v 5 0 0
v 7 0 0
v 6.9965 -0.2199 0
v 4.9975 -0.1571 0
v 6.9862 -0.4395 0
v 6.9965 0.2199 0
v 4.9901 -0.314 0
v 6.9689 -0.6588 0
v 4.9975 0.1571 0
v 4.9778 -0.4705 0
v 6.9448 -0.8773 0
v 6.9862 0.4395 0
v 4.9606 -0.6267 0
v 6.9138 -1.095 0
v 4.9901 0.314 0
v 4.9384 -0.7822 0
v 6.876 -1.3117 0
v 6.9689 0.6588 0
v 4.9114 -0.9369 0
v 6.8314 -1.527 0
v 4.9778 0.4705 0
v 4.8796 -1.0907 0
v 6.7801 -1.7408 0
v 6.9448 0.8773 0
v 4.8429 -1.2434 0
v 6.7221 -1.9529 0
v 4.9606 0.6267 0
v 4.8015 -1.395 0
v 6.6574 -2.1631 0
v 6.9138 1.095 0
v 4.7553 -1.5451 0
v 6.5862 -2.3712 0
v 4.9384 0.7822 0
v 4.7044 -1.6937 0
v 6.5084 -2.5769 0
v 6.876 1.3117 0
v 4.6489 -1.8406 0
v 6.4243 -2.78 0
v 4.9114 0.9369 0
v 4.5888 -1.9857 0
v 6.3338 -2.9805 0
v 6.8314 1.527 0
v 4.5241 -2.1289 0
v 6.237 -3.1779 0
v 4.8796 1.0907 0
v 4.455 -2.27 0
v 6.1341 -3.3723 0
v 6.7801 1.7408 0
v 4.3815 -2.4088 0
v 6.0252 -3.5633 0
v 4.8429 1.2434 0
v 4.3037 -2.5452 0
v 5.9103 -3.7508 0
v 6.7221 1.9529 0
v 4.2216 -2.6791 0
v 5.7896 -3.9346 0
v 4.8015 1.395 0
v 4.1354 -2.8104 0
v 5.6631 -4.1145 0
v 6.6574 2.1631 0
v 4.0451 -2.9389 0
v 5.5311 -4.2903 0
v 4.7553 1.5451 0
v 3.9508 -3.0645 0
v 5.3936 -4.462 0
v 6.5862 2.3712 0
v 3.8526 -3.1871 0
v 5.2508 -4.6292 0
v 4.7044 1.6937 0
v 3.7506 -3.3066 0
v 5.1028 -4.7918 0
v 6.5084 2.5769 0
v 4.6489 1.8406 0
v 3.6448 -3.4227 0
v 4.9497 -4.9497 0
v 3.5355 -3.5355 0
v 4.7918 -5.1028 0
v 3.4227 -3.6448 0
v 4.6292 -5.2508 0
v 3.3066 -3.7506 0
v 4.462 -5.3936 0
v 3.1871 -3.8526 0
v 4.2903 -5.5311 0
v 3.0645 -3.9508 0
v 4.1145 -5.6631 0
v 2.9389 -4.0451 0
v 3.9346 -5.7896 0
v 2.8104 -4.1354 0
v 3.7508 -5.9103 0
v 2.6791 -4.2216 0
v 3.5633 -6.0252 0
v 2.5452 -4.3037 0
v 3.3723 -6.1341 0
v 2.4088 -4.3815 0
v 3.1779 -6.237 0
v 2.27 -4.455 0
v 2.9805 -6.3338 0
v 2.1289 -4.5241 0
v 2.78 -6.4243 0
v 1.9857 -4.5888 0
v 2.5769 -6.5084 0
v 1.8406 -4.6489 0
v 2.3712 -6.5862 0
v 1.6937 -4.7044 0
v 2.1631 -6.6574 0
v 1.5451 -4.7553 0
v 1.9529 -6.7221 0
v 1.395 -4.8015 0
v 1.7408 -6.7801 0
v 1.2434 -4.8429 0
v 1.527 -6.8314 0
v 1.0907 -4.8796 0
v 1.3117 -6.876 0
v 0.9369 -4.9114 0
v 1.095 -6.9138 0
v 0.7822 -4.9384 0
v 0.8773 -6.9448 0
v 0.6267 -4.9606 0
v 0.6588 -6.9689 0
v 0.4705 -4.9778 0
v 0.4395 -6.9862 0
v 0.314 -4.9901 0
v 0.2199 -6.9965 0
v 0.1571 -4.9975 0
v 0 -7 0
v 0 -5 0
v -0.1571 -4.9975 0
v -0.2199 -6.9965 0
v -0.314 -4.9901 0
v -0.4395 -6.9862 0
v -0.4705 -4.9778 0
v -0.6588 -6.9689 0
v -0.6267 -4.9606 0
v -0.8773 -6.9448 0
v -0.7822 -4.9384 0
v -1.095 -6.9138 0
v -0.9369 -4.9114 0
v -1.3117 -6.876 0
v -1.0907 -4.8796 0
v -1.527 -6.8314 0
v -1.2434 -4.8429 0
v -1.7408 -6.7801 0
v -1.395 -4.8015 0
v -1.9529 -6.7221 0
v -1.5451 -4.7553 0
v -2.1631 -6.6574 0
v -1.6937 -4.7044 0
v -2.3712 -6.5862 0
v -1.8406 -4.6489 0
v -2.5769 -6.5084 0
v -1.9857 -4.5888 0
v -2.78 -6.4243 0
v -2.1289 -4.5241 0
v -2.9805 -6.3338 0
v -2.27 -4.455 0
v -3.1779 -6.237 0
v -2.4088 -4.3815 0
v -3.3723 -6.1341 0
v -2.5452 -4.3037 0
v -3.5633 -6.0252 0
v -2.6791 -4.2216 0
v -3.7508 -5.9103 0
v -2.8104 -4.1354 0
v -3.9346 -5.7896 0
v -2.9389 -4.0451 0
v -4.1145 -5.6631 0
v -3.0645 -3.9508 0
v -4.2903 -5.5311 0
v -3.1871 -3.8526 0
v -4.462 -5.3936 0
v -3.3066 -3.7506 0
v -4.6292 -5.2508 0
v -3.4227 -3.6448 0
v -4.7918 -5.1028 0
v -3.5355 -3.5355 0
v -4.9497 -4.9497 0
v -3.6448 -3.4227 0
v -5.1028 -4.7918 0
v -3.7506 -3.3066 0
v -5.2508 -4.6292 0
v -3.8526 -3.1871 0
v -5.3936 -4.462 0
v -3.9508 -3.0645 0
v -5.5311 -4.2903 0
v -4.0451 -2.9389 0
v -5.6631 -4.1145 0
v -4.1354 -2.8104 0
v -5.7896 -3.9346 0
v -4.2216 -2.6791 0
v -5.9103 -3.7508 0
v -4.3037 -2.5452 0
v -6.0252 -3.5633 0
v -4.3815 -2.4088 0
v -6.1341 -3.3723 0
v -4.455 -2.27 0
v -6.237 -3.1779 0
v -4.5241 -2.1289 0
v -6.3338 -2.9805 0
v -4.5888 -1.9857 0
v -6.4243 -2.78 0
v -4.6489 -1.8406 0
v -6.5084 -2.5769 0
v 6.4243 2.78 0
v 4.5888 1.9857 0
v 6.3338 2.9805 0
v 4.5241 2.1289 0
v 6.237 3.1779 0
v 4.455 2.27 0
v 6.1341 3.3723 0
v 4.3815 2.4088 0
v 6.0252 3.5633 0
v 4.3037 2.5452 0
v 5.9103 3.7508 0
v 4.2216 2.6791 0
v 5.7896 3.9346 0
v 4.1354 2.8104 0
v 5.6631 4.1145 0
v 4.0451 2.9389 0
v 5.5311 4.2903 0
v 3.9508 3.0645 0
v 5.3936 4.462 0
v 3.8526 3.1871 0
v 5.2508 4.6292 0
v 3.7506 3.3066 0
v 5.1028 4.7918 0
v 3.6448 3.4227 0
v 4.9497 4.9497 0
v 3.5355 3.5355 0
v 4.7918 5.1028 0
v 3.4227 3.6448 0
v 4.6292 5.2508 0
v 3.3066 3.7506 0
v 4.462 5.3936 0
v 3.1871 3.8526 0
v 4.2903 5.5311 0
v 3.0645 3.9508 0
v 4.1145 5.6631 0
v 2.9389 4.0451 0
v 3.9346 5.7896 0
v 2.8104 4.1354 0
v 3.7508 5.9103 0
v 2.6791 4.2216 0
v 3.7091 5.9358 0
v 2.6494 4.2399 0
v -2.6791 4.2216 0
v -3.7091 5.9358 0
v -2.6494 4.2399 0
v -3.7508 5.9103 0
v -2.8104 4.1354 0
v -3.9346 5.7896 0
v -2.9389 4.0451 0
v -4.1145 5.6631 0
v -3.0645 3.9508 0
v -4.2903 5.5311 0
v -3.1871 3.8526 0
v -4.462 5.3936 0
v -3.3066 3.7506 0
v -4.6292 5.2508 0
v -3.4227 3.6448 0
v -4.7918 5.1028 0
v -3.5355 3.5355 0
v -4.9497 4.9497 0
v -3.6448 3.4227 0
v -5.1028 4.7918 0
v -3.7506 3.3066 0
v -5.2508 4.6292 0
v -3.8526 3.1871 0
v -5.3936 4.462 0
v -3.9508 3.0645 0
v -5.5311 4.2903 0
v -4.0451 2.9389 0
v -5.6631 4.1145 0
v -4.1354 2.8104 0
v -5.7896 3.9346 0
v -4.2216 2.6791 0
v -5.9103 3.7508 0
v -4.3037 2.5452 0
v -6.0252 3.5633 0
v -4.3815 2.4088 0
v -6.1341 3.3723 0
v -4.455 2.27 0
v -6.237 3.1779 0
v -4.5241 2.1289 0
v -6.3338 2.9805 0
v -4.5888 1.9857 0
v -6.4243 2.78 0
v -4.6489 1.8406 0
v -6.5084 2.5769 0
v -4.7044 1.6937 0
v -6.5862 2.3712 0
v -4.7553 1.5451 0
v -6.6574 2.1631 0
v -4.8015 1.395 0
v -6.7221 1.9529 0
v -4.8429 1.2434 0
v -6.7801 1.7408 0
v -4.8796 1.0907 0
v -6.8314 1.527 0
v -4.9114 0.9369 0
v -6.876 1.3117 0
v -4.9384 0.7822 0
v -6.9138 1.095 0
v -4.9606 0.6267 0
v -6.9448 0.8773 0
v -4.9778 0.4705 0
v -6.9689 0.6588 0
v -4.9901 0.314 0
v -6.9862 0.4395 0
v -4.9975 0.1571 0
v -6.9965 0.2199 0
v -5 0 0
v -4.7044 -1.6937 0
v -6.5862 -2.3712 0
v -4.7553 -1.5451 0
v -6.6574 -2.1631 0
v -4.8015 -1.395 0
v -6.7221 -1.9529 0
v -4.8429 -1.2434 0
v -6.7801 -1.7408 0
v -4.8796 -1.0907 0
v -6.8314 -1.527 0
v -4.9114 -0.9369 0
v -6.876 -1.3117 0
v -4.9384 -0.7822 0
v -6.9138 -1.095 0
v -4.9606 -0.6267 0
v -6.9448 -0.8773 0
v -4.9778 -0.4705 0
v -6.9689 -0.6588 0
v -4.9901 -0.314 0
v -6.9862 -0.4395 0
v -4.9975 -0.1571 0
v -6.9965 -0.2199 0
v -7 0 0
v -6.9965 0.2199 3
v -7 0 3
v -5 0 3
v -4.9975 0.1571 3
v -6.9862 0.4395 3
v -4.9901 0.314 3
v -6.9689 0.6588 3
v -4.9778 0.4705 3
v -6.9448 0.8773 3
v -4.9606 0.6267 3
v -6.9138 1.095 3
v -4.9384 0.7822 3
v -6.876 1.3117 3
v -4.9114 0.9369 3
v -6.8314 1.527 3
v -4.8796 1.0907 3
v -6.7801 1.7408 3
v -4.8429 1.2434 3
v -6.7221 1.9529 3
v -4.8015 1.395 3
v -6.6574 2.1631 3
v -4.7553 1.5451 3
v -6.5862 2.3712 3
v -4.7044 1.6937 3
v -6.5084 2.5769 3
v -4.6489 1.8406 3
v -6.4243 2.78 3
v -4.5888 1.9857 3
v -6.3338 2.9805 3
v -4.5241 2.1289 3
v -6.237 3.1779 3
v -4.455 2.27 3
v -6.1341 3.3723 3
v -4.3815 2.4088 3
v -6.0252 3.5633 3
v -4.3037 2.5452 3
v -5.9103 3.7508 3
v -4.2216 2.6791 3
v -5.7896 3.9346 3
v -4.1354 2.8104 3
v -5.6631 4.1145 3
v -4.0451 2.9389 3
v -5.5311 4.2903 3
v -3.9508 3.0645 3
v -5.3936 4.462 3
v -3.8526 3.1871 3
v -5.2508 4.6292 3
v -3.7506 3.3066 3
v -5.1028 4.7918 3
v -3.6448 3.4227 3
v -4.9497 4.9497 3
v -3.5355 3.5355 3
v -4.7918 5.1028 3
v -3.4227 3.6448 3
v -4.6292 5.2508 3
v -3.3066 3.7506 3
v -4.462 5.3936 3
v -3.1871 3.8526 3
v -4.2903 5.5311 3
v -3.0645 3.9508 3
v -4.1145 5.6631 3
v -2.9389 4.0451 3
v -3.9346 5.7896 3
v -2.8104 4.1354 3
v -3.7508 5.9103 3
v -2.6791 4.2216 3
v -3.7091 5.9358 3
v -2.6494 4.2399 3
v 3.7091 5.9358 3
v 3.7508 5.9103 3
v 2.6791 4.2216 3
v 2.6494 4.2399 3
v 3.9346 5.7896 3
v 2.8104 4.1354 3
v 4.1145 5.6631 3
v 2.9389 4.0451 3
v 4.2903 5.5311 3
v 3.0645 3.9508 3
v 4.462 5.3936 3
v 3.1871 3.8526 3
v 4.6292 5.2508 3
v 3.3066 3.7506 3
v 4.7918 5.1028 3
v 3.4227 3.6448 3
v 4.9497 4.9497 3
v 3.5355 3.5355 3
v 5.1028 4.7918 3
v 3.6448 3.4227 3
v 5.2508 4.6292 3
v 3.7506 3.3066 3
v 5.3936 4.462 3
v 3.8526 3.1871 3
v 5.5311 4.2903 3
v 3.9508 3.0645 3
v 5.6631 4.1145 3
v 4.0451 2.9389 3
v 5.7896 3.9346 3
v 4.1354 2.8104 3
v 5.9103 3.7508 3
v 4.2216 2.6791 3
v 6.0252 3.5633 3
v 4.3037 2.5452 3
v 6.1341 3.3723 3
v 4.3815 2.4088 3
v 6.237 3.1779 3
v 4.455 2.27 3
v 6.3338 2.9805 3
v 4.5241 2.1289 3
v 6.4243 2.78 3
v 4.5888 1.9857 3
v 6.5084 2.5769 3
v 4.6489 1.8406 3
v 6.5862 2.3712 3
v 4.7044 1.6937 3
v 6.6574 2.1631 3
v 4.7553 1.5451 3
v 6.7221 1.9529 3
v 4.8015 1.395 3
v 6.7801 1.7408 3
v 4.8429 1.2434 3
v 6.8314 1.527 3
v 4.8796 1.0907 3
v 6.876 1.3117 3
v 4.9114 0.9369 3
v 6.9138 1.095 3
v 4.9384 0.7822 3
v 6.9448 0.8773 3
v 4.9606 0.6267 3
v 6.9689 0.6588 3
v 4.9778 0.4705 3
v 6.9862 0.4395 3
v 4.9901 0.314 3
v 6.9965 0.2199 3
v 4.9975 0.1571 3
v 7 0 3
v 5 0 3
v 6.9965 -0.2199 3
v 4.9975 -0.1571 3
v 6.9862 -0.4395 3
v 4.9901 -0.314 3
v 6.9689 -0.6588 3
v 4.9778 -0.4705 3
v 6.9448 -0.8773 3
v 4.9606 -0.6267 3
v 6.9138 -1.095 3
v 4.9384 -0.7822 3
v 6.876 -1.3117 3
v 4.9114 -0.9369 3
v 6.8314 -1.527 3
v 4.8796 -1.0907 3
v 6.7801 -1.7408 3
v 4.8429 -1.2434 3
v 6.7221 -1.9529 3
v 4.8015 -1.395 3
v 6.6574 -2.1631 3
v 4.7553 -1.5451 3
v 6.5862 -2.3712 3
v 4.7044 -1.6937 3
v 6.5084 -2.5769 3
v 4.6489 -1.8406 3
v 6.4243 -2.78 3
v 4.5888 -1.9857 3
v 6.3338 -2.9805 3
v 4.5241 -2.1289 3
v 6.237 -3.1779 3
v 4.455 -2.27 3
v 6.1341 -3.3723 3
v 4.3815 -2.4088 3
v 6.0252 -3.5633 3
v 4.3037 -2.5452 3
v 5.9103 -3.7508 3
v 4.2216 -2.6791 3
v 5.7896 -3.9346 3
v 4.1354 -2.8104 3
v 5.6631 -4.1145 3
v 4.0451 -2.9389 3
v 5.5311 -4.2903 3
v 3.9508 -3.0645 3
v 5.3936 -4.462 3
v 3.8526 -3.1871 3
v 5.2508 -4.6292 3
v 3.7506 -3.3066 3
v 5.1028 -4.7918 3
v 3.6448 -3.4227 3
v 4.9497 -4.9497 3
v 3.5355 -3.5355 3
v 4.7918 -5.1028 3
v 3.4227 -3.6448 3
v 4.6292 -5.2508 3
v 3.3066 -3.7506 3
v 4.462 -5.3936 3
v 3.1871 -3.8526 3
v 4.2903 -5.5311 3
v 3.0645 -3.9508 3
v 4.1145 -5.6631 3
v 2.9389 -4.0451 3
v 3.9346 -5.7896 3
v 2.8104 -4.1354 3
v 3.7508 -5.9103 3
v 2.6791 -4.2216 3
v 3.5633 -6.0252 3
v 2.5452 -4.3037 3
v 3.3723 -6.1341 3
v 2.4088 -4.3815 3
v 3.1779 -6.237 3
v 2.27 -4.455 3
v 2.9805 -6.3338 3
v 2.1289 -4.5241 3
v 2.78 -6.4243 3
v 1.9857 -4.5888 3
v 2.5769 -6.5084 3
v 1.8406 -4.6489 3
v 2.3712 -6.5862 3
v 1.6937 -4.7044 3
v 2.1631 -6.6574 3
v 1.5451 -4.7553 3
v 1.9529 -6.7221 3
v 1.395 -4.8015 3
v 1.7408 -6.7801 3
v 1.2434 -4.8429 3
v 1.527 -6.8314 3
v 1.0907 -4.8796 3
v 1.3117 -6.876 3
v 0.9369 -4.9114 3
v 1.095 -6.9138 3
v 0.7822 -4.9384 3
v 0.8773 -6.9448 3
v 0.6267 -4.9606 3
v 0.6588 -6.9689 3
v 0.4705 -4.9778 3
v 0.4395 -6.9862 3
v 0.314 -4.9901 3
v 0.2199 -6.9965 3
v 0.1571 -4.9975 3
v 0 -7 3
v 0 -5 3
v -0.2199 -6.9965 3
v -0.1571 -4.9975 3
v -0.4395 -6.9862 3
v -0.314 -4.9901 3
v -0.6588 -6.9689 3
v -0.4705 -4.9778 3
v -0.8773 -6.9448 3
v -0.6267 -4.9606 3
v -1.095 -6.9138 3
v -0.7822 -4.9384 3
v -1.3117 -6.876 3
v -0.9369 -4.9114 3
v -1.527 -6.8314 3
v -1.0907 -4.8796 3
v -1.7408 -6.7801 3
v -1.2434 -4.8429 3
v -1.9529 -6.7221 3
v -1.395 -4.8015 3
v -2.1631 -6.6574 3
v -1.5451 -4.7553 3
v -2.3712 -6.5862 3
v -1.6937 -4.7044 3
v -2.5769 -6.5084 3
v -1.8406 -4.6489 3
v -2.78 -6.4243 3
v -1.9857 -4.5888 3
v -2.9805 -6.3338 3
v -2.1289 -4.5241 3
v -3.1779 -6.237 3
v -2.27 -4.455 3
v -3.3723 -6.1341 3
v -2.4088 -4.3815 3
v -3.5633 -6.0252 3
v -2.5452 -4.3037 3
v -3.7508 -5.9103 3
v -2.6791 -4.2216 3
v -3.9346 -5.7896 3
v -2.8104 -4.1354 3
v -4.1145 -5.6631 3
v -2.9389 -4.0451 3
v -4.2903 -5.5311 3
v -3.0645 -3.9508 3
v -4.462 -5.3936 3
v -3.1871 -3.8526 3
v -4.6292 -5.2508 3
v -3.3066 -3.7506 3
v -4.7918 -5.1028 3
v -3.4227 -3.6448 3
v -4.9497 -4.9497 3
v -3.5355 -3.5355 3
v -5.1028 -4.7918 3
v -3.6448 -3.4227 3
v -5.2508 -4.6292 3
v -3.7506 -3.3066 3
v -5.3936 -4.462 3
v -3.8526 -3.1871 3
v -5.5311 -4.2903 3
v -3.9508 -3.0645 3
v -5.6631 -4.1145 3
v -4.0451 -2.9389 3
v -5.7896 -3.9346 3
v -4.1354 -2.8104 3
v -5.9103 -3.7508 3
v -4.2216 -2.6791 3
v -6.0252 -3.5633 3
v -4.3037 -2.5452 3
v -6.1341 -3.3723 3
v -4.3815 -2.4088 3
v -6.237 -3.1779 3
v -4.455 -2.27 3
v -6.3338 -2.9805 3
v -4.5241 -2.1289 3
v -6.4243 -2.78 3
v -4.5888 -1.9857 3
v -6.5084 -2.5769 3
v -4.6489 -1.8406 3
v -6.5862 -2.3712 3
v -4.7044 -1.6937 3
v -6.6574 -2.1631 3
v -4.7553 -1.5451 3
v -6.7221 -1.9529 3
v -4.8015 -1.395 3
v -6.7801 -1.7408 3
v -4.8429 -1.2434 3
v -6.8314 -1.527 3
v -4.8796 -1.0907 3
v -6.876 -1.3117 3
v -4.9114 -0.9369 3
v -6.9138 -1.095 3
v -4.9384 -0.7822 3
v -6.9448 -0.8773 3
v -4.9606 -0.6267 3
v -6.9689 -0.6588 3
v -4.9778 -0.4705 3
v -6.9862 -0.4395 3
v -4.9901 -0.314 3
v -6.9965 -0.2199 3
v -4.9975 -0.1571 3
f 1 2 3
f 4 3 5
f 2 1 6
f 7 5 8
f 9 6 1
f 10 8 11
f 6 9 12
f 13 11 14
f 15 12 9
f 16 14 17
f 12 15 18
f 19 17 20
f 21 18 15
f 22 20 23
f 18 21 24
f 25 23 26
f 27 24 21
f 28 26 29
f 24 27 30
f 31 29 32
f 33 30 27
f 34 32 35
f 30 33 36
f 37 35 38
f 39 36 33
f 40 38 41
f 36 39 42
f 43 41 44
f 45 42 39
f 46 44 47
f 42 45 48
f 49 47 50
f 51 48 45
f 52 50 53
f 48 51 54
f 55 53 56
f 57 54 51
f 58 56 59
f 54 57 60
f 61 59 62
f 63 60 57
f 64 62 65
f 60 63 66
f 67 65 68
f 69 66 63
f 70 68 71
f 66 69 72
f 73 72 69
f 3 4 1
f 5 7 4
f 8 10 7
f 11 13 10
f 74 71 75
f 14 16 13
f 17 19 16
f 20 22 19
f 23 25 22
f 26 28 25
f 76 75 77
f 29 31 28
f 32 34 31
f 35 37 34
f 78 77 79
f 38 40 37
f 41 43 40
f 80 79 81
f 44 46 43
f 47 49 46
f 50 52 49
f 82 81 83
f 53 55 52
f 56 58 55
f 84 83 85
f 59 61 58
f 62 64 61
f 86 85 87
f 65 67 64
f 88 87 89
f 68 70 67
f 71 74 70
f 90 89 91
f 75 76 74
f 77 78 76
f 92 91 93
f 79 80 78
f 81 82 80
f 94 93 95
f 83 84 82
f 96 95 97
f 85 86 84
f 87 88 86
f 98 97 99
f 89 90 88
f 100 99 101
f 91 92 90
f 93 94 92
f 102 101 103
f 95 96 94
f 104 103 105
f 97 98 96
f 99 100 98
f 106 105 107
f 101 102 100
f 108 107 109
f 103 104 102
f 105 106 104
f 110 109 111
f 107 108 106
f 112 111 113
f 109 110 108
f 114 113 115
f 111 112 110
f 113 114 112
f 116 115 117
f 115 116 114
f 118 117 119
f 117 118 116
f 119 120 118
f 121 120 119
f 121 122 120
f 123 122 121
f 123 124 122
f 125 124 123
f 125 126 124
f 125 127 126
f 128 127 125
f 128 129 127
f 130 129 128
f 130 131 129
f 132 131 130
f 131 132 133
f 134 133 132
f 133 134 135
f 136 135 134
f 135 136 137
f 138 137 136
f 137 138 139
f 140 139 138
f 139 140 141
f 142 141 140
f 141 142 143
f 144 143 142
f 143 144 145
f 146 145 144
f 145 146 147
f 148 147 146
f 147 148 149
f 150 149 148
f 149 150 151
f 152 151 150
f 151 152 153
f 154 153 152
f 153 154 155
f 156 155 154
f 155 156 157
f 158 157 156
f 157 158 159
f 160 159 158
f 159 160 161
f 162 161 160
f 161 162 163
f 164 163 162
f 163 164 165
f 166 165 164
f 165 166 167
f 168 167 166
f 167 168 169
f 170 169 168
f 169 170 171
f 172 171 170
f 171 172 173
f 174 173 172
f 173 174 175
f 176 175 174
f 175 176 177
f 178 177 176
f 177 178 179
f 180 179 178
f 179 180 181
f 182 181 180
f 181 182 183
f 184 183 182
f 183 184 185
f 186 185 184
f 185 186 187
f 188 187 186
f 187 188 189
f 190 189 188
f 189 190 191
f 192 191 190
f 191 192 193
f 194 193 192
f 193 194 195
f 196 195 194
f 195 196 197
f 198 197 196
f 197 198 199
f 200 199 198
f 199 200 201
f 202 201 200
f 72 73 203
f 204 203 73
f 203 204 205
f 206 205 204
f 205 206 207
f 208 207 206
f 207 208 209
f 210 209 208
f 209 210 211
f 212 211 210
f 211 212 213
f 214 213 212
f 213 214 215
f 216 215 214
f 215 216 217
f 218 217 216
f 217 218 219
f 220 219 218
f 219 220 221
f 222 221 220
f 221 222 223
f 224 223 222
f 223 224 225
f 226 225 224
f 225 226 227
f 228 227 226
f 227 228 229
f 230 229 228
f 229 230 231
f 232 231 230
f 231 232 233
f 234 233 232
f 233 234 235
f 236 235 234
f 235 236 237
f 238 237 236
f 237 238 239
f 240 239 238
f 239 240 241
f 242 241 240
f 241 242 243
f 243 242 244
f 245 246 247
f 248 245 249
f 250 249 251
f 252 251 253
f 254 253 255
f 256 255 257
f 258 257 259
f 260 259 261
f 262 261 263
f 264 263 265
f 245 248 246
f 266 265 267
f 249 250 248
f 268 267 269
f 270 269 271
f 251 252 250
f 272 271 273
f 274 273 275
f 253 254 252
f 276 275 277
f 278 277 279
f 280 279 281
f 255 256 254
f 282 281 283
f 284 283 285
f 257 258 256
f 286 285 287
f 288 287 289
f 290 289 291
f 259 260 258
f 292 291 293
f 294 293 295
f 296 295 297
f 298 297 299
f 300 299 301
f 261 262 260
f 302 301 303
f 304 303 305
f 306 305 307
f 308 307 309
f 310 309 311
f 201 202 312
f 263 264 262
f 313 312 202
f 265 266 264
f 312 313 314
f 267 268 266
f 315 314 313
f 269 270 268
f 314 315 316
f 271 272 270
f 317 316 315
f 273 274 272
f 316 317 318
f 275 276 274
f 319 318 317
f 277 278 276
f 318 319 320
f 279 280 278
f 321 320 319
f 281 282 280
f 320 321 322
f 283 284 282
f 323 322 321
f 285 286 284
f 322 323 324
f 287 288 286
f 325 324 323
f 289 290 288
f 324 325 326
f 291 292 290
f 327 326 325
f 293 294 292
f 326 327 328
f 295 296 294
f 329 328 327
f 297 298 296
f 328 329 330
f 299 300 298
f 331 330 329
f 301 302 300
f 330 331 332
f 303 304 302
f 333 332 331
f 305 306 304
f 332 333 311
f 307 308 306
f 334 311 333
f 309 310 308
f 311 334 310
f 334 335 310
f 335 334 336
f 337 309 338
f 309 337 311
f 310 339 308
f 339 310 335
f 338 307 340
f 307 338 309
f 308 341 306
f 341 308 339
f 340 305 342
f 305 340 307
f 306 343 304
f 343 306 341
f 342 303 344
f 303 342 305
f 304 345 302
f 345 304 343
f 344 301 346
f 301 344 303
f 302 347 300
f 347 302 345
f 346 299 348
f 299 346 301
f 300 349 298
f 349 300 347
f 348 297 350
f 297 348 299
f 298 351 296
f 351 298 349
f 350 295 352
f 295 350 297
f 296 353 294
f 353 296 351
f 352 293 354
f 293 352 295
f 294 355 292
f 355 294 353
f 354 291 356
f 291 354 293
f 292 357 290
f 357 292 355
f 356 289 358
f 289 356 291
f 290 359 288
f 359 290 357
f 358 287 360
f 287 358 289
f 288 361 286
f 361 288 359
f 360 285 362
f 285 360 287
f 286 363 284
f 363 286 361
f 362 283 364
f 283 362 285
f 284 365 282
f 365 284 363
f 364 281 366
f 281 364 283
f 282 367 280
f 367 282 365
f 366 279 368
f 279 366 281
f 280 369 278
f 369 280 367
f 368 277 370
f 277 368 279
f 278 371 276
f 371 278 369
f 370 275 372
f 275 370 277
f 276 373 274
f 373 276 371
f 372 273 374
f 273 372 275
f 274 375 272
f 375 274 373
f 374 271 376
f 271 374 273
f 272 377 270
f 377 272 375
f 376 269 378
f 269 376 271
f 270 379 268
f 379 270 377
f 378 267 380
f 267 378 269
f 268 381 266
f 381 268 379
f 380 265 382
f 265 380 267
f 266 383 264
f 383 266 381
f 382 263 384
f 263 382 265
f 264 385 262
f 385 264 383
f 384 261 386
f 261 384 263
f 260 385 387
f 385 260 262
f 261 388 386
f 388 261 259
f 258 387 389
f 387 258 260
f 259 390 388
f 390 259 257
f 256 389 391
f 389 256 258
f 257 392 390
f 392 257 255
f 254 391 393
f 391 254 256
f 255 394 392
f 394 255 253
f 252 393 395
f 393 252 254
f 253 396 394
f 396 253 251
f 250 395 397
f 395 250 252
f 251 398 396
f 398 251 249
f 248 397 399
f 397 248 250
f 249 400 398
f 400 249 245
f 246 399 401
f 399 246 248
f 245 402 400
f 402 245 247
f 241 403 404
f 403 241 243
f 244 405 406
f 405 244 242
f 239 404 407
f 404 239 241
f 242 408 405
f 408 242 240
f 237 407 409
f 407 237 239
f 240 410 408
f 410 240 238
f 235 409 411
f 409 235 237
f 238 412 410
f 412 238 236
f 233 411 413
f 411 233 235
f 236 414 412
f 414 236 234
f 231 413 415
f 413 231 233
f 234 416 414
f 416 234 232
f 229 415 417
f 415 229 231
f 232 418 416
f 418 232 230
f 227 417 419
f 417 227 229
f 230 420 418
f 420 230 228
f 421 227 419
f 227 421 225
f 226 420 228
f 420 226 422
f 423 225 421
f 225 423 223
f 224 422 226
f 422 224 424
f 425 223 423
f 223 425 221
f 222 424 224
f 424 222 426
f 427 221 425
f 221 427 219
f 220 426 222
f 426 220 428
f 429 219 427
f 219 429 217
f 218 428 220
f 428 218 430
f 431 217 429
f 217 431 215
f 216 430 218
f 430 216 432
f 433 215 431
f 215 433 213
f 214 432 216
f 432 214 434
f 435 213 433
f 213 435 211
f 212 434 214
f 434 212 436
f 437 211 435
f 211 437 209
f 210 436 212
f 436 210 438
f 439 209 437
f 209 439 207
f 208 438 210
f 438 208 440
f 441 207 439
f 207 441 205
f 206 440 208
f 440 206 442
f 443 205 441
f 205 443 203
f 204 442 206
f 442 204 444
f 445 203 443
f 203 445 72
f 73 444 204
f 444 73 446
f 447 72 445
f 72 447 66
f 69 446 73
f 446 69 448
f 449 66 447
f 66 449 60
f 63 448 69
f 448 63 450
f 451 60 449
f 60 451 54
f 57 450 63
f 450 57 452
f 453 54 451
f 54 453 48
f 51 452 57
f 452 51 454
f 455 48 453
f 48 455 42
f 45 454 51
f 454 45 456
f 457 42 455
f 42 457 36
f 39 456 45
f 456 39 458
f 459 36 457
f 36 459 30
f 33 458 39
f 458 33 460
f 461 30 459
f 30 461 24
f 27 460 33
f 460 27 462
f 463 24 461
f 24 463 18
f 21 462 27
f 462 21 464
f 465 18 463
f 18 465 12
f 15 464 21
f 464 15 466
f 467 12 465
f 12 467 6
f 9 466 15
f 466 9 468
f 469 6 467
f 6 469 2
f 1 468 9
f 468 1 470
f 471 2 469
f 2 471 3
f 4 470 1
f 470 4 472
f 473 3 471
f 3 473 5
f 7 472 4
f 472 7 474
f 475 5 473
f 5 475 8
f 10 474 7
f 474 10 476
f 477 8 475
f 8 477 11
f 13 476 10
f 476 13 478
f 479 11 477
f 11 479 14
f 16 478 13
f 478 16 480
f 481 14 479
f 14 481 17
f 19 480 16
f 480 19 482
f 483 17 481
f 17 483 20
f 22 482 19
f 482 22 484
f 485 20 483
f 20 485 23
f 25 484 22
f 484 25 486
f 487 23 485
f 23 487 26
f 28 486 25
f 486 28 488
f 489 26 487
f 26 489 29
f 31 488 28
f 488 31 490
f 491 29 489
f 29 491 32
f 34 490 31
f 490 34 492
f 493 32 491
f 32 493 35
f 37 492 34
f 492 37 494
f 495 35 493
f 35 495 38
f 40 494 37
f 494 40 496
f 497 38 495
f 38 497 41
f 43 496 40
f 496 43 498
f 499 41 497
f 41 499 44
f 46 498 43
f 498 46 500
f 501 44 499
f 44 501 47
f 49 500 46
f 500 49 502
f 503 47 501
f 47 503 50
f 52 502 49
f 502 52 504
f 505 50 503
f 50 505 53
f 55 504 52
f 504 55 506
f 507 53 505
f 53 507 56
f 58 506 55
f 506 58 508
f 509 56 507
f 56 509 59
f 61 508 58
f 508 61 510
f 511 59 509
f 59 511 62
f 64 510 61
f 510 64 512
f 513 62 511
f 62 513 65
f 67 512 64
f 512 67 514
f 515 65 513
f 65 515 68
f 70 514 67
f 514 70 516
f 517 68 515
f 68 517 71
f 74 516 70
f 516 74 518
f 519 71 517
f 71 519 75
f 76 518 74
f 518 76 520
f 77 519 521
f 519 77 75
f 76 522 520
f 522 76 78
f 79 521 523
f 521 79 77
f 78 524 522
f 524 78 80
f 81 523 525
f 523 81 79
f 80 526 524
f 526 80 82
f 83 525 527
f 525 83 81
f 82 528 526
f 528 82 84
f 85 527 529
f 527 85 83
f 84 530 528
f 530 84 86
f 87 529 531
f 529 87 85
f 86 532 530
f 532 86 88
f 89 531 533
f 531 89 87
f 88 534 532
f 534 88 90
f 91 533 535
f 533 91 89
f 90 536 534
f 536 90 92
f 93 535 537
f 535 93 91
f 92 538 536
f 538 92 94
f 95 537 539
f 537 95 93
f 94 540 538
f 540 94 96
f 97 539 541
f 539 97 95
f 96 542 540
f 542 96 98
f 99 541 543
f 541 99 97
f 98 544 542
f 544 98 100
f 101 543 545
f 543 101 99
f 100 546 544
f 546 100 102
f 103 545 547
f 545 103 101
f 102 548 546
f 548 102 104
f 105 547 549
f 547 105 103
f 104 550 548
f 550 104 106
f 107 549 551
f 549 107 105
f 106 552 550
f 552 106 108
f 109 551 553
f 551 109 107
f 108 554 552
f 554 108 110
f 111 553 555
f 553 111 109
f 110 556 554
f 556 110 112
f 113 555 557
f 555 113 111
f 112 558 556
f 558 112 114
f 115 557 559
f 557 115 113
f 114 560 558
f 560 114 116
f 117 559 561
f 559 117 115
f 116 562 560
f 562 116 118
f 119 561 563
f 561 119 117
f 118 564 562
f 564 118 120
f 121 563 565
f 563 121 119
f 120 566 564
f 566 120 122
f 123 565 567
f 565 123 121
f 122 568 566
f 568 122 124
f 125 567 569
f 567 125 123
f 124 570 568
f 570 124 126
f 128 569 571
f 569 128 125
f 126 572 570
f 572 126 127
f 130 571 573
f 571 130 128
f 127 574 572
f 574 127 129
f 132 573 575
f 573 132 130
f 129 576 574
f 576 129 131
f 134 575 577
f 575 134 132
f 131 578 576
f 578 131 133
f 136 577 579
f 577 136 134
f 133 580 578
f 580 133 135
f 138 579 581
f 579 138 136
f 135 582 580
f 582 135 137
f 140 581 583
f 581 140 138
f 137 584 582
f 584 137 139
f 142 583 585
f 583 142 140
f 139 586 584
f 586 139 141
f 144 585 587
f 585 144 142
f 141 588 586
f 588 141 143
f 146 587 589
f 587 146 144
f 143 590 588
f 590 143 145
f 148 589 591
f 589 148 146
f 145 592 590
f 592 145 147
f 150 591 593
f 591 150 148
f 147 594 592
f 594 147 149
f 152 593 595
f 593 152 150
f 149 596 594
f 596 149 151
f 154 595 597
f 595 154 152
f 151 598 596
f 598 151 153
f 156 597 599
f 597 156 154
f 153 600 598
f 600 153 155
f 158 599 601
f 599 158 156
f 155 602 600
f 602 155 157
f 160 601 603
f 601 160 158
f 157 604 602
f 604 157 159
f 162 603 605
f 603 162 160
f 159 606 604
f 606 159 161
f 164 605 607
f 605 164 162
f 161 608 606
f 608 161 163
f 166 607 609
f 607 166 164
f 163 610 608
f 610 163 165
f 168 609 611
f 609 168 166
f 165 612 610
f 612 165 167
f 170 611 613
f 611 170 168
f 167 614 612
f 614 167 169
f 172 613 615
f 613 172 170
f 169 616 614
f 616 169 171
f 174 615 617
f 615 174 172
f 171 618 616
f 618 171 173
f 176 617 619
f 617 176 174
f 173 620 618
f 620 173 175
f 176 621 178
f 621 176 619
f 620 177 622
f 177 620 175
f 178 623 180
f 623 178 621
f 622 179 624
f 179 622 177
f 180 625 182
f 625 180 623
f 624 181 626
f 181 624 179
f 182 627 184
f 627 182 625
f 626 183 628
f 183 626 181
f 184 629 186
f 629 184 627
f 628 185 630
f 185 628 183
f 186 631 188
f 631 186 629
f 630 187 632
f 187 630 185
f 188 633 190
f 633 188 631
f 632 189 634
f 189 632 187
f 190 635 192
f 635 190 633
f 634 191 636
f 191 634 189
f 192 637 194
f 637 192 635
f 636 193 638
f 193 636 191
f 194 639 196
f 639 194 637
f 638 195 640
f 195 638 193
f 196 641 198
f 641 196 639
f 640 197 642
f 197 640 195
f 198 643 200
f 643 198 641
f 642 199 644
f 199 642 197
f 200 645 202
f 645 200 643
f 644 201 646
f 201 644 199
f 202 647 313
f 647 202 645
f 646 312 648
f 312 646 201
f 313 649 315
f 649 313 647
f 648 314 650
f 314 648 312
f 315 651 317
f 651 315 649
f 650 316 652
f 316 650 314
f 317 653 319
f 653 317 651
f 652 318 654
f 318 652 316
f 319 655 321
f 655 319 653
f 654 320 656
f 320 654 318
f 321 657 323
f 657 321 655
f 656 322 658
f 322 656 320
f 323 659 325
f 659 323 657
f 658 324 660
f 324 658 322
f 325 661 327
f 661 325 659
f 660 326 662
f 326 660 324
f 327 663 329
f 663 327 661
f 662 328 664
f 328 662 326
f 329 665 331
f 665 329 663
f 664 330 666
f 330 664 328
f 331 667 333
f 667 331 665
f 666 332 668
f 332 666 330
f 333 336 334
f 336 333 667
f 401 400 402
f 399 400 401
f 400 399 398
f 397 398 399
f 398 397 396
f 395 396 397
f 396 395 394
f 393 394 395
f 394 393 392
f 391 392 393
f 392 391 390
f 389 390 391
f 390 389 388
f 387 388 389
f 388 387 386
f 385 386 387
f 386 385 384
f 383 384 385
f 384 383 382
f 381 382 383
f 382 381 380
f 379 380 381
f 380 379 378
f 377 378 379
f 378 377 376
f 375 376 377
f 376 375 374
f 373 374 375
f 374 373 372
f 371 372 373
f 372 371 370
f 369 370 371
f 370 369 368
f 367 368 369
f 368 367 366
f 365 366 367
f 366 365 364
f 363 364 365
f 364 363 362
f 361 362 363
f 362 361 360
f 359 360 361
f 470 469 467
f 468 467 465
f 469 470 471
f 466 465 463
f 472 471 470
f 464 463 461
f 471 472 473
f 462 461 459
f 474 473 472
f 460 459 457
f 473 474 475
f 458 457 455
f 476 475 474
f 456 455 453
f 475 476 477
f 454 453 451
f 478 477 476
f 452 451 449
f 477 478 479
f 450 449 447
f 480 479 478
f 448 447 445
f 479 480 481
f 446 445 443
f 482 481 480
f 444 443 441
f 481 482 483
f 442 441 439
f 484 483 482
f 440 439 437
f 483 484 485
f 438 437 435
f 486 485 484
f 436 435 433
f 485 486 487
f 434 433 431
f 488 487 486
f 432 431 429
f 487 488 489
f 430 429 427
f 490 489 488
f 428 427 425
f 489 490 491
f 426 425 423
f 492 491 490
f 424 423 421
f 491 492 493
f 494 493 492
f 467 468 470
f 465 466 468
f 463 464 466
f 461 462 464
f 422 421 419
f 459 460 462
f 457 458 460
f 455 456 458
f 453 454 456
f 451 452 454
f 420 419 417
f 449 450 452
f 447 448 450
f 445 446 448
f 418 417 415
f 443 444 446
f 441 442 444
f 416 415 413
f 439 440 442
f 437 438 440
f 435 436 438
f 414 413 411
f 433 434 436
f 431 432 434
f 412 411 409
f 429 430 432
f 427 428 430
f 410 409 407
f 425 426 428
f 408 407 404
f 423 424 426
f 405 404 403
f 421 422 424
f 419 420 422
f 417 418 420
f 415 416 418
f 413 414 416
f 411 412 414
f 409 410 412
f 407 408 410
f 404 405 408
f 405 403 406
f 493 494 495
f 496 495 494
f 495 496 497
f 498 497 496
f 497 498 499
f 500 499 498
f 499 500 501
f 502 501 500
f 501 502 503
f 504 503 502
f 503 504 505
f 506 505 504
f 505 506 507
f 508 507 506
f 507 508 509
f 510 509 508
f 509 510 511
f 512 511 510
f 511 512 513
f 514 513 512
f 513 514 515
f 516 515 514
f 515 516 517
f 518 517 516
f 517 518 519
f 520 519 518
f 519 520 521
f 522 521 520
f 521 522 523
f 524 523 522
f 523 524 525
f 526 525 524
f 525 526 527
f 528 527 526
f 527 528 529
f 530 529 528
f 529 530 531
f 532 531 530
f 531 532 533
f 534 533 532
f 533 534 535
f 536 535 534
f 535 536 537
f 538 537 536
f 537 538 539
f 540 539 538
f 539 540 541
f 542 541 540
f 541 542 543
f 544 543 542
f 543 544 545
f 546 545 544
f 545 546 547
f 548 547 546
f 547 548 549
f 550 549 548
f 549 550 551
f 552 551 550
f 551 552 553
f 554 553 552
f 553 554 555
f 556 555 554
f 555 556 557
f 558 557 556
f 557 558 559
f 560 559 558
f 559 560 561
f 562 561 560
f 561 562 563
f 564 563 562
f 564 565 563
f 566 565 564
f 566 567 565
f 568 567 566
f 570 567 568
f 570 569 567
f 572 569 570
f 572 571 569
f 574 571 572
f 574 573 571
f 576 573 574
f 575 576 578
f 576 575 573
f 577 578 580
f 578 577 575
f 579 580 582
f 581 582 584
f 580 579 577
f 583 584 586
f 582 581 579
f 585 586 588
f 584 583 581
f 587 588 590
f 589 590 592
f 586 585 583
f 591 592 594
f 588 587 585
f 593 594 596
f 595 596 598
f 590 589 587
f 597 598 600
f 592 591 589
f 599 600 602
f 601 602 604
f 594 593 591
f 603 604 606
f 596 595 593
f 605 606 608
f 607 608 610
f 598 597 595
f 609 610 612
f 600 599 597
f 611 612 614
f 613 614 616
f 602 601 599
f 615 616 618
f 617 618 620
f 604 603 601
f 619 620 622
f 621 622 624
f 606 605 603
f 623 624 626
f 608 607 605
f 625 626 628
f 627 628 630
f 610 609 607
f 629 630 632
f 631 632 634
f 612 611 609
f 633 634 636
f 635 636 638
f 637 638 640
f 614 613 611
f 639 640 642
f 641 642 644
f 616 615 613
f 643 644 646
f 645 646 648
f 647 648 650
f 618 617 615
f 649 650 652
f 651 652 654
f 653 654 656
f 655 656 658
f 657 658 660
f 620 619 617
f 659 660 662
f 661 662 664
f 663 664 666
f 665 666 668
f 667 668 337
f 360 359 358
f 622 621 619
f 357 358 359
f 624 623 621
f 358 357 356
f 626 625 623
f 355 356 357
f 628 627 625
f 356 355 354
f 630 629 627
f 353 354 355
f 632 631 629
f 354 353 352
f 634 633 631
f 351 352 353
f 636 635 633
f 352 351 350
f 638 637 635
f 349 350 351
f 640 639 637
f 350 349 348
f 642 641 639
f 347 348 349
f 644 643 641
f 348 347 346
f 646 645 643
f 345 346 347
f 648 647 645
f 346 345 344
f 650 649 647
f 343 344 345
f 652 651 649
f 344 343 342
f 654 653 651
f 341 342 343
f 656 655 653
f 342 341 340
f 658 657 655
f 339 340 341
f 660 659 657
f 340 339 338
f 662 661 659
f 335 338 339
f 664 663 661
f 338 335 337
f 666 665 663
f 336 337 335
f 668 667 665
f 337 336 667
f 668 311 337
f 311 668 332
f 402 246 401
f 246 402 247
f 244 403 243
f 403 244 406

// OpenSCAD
// Inner diameter
diameter = 10;

// Wall thickness
thickness = 2;

// Clip length
length = 3;

// Opening angle
angle = 64;

cutout = diameter*2;

difference() {
  rotate_extrude($fn=200)
    translate([diameter/2,0,0])
      square([thickness, length]);

  translate([0,0,-1])linear_extrude(height=length*2)
    polygon([[0,0],[sin(angle/2)*cutout,cos(angle/2)*cutout],[-sin(angle/2)*cutout,cos(angle/2)*cutout]]);
}
